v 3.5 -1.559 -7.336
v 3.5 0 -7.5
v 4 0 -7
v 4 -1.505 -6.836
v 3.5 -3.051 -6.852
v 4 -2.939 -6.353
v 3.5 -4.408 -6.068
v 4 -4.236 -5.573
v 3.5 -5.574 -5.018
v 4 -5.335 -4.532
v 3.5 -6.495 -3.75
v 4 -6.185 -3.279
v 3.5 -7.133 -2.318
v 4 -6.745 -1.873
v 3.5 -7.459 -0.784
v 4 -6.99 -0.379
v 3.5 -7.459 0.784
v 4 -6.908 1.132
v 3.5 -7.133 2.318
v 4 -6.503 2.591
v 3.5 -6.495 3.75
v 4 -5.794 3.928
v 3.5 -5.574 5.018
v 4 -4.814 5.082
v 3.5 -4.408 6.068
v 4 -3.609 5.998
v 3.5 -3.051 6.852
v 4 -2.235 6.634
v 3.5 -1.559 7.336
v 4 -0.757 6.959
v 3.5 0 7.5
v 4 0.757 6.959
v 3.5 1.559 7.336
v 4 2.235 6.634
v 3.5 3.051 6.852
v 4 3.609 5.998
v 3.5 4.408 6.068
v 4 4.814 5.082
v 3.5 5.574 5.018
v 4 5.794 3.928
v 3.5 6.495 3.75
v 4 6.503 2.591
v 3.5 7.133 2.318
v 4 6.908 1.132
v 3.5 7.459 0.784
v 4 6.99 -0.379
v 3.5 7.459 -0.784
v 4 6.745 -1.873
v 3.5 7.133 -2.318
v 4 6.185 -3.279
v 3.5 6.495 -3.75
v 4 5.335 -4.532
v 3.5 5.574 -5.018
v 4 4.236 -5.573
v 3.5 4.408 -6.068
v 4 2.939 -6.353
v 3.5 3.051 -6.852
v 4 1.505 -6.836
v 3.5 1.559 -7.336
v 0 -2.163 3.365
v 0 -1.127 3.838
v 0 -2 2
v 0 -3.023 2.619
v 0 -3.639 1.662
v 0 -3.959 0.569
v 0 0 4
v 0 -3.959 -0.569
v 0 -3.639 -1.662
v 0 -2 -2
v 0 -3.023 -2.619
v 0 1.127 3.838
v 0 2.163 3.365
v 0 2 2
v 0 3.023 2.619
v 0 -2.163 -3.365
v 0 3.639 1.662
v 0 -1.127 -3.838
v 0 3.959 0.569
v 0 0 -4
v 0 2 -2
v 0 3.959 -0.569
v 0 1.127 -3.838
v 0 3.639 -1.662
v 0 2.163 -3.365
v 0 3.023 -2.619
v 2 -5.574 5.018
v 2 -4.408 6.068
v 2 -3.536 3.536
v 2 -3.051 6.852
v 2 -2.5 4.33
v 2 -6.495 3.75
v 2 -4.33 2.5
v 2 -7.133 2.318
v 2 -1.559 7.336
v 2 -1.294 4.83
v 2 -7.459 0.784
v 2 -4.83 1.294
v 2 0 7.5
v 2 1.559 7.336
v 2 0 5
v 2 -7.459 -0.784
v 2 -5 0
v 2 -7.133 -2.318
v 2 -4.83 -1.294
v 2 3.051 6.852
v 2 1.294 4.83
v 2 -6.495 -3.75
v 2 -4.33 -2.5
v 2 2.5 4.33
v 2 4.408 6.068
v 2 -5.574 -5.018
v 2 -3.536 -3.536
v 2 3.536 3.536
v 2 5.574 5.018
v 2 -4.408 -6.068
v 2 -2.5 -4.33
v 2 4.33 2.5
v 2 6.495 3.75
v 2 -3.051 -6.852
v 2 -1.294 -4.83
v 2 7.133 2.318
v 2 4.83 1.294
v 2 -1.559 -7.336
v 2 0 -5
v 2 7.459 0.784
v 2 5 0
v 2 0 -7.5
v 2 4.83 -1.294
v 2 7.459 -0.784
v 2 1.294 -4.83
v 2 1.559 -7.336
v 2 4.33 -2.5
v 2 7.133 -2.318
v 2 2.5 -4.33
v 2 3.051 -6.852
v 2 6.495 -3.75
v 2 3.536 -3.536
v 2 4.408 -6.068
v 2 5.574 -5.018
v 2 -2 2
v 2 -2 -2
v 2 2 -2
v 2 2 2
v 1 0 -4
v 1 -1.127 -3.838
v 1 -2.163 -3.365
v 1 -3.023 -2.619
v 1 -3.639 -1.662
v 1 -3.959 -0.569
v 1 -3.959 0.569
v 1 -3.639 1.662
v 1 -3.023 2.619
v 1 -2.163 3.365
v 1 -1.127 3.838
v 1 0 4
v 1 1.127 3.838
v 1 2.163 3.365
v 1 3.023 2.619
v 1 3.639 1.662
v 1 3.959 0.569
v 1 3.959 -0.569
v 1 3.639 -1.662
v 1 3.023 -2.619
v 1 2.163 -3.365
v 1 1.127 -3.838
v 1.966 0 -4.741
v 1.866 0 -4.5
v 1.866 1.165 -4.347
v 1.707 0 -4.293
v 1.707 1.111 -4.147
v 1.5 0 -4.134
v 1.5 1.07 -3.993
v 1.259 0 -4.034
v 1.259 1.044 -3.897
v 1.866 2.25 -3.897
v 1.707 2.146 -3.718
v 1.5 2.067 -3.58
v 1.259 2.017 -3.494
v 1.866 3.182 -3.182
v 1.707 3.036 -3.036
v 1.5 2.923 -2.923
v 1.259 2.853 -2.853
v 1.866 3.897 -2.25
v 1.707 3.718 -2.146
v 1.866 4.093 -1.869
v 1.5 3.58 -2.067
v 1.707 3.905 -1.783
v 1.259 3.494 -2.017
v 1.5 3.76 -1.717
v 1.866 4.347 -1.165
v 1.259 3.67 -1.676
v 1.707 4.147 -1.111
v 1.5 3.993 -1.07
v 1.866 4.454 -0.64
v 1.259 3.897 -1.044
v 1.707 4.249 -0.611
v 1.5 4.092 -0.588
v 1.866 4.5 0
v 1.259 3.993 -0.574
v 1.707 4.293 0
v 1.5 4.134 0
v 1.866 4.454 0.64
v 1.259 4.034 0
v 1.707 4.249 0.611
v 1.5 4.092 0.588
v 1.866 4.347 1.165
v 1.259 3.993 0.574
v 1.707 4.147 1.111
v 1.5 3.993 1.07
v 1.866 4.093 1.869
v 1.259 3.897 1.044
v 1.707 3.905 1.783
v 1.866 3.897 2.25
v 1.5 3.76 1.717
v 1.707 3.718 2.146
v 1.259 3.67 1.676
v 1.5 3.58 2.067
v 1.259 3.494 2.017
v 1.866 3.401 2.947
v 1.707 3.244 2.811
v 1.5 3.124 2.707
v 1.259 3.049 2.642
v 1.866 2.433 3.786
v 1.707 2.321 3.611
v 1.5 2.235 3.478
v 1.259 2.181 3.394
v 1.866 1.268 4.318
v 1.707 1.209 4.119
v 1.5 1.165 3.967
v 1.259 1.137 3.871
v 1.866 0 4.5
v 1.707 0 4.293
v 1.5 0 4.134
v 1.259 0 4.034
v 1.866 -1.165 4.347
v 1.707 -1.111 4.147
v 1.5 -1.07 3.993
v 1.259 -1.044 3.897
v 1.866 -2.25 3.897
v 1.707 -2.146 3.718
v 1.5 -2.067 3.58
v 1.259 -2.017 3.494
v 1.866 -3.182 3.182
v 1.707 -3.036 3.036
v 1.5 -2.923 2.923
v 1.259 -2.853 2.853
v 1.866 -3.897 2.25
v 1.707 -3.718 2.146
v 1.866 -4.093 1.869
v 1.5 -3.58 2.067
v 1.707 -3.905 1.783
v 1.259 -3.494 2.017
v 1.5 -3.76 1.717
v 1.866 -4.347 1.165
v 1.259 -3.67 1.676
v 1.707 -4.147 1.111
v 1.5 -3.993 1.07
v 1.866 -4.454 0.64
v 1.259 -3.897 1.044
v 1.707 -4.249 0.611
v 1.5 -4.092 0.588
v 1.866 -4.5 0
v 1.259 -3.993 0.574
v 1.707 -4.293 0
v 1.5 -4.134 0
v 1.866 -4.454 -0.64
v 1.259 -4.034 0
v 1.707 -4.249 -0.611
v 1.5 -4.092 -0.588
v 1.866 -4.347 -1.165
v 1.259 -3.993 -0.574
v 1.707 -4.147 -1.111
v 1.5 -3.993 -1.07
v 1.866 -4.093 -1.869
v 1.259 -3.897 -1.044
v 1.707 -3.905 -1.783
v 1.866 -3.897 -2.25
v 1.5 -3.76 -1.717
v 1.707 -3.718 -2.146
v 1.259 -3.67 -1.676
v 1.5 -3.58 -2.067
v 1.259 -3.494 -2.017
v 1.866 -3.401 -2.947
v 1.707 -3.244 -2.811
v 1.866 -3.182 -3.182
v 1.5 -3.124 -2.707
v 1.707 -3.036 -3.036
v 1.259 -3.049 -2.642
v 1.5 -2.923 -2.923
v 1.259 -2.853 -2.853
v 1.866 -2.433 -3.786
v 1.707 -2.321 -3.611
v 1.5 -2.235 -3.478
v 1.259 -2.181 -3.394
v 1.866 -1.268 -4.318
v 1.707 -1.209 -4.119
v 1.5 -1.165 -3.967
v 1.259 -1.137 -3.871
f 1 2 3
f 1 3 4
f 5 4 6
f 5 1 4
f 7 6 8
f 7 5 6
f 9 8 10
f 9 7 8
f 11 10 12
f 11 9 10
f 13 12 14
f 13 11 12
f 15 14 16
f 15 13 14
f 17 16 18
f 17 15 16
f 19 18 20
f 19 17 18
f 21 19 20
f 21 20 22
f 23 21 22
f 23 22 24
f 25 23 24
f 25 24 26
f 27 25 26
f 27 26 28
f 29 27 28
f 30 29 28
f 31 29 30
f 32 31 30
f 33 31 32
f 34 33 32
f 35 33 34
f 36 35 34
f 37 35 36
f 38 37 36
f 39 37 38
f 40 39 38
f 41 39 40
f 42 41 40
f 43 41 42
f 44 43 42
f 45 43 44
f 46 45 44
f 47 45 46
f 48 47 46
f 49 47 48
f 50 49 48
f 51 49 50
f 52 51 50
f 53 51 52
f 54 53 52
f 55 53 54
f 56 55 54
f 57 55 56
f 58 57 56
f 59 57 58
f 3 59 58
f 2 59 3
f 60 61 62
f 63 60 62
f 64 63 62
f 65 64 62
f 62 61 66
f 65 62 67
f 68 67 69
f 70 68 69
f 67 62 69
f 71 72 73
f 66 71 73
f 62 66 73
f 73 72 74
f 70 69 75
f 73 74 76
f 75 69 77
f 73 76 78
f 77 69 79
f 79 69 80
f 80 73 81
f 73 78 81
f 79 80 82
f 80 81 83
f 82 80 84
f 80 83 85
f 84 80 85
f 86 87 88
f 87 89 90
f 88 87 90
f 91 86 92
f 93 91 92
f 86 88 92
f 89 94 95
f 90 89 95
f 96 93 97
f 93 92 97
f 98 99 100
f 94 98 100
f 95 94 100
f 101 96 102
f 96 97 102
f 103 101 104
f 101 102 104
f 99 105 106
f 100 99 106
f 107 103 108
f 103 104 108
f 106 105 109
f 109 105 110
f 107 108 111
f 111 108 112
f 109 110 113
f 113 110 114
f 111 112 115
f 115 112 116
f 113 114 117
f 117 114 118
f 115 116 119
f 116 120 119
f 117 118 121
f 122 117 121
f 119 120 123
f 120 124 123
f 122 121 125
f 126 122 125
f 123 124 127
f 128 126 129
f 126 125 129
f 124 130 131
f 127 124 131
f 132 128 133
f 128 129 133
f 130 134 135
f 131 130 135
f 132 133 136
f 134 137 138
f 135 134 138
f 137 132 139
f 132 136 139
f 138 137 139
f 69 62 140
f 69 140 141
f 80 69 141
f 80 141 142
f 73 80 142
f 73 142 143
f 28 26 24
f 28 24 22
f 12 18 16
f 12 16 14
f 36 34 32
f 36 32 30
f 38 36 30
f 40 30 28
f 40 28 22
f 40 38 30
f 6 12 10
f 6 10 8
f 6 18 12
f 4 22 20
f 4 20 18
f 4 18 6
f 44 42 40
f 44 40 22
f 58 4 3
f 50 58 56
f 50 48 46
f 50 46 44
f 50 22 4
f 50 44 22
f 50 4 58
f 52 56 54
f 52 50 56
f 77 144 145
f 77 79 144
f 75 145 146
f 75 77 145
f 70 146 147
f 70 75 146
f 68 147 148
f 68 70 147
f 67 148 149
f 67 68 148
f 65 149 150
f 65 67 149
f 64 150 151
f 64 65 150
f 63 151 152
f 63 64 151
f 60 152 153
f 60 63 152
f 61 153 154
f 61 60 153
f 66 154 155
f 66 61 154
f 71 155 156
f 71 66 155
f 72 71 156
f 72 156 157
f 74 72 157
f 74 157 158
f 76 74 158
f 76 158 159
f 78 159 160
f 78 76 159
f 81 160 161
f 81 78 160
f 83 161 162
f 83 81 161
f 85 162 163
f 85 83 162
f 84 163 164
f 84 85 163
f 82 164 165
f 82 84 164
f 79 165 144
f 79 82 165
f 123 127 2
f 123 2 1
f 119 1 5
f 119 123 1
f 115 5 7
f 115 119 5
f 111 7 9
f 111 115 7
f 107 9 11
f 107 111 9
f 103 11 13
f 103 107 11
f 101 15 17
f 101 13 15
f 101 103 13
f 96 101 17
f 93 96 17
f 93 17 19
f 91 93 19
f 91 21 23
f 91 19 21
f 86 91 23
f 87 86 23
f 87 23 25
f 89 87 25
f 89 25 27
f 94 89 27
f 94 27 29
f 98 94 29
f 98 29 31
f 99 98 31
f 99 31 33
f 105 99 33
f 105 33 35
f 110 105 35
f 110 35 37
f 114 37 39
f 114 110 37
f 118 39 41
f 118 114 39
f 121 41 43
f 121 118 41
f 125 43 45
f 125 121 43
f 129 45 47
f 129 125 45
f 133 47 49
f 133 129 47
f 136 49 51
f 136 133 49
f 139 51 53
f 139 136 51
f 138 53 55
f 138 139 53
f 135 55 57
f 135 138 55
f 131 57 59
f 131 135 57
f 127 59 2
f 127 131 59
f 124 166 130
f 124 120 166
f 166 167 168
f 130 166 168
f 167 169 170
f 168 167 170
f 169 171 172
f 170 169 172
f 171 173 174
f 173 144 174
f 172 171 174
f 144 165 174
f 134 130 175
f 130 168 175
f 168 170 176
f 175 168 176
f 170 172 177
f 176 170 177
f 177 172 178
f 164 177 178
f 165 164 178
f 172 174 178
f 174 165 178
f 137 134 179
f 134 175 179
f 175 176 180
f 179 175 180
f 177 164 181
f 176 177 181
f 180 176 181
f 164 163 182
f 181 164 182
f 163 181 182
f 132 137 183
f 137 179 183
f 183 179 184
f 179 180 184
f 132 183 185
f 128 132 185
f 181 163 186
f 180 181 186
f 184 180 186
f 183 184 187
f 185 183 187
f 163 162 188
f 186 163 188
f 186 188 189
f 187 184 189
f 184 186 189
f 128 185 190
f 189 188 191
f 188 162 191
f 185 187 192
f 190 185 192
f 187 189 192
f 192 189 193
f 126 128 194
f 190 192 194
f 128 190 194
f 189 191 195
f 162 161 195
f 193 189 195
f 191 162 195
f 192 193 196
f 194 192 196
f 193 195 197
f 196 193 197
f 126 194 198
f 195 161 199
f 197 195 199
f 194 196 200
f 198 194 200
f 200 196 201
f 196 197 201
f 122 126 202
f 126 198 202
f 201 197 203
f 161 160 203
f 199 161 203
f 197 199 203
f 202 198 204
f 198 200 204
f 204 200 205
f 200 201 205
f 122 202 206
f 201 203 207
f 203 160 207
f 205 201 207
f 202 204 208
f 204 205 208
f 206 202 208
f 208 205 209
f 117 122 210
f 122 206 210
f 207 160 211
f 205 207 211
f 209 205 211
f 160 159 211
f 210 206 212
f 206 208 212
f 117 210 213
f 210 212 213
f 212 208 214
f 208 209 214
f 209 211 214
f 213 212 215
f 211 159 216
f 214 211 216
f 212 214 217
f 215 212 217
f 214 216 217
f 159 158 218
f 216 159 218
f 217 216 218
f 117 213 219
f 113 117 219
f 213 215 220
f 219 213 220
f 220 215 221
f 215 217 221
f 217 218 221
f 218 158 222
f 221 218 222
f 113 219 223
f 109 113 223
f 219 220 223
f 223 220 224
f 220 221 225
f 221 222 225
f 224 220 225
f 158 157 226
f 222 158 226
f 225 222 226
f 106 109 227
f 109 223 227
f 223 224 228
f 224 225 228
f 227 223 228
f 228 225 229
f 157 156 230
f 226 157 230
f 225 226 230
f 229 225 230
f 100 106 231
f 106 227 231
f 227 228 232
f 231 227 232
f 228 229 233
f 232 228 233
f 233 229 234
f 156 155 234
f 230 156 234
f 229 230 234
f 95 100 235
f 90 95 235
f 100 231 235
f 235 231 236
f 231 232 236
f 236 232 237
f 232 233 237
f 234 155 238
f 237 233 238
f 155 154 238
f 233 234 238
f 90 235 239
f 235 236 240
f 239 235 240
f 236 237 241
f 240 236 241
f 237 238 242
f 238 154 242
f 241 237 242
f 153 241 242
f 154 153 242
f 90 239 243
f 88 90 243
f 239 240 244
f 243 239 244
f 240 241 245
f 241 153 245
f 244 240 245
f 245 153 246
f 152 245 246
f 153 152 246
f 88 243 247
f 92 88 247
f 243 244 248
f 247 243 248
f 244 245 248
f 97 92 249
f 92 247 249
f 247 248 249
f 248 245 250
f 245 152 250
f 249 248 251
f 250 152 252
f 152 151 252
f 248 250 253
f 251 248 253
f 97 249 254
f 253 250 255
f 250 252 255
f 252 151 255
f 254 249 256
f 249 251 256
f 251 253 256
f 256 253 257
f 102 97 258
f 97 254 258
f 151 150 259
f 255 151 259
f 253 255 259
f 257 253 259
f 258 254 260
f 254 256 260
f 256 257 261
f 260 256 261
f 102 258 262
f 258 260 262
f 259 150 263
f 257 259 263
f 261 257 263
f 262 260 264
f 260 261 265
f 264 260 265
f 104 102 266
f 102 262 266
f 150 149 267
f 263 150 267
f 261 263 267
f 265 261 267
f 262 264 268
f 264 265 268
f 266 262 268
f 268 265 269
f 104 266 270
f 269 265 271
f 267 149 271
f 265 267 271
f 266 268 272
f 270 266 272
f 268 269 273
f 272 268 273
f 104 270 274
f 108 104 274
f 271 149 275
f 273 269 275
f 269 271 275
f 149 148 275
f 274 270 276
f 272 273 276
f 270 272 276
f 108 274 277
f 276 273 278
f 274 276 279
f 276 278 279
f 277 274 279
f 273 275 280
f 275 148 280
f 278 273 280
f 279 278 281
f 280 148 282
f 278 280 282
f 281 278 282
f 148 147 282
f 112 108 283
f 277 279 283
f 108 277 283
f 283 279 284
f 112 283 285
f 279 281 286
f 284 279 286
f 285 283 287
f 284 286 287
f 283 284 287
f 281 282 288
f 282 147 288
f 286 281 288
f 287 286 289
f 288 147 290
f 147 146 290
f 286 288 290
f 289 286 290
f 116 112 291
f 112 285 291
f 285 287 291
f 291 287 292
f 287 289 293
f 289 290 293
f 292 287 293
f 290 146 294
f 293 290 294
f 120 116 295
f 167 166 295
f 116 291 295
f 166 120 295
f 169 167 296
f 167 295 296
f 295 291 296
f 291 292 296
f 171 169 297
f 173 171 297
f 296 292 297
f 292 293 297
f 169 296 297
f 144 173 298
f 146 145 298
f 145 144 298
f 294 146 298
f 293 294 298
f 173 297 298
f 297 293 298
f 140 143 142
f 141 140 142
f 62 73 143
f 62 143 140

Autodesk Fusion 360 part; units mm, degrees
sketch "Sketch1" plane through (0, 0, 0) normal (1, 0, 0) x (0, 0, -1)
  circle A0 centre (0, 0) radius 4
  line L0 (2, 2) -> (-2, 2)
  line L1 (-2, 2) -> (-2, -2)
  line L2 (-2, -2) -> (2, -2)
  line L3 (2, -2) -> (2, 2)
  line L4 (2, 2) -> (-2, -2) construction
  line L5 (-2, 2) -> (2, -2) construction
  dimension "d1" = 8
  dimension "d2" = 4
  dimension "d3" = 4
extrude "Extrude1" add sketch "Sketch1" along normal blind 2
sketch "Sketch2" plane through (2, 0, 0) normal (1, 0, 0) x (0, 0, -1)
  line L0 (2, 2) -> (2, -2)
  line L1 (2, -2) -> (-2, -2)
  line L2 (-2, -2) -> (-2, 2)
  line L3 (-2, 2) -> (2, 2)
  circle A0 centre (0, 0) radius 4
  circle A1 centre (0, 0) radius 7.5
  dimension "d6" = 15
extrude "Extrude2" add sketch "Sketch2" along normal blind 2 contours L0 L1 L2 L3 | A0 | A1
fillet "Fillet1" radius 1 1 edges at (2, -1.4465, 3.7293)
chamfer "Chamfer1" distance 0.5 angle 45 1 edges at (4, -2.7121, 6.9925)
